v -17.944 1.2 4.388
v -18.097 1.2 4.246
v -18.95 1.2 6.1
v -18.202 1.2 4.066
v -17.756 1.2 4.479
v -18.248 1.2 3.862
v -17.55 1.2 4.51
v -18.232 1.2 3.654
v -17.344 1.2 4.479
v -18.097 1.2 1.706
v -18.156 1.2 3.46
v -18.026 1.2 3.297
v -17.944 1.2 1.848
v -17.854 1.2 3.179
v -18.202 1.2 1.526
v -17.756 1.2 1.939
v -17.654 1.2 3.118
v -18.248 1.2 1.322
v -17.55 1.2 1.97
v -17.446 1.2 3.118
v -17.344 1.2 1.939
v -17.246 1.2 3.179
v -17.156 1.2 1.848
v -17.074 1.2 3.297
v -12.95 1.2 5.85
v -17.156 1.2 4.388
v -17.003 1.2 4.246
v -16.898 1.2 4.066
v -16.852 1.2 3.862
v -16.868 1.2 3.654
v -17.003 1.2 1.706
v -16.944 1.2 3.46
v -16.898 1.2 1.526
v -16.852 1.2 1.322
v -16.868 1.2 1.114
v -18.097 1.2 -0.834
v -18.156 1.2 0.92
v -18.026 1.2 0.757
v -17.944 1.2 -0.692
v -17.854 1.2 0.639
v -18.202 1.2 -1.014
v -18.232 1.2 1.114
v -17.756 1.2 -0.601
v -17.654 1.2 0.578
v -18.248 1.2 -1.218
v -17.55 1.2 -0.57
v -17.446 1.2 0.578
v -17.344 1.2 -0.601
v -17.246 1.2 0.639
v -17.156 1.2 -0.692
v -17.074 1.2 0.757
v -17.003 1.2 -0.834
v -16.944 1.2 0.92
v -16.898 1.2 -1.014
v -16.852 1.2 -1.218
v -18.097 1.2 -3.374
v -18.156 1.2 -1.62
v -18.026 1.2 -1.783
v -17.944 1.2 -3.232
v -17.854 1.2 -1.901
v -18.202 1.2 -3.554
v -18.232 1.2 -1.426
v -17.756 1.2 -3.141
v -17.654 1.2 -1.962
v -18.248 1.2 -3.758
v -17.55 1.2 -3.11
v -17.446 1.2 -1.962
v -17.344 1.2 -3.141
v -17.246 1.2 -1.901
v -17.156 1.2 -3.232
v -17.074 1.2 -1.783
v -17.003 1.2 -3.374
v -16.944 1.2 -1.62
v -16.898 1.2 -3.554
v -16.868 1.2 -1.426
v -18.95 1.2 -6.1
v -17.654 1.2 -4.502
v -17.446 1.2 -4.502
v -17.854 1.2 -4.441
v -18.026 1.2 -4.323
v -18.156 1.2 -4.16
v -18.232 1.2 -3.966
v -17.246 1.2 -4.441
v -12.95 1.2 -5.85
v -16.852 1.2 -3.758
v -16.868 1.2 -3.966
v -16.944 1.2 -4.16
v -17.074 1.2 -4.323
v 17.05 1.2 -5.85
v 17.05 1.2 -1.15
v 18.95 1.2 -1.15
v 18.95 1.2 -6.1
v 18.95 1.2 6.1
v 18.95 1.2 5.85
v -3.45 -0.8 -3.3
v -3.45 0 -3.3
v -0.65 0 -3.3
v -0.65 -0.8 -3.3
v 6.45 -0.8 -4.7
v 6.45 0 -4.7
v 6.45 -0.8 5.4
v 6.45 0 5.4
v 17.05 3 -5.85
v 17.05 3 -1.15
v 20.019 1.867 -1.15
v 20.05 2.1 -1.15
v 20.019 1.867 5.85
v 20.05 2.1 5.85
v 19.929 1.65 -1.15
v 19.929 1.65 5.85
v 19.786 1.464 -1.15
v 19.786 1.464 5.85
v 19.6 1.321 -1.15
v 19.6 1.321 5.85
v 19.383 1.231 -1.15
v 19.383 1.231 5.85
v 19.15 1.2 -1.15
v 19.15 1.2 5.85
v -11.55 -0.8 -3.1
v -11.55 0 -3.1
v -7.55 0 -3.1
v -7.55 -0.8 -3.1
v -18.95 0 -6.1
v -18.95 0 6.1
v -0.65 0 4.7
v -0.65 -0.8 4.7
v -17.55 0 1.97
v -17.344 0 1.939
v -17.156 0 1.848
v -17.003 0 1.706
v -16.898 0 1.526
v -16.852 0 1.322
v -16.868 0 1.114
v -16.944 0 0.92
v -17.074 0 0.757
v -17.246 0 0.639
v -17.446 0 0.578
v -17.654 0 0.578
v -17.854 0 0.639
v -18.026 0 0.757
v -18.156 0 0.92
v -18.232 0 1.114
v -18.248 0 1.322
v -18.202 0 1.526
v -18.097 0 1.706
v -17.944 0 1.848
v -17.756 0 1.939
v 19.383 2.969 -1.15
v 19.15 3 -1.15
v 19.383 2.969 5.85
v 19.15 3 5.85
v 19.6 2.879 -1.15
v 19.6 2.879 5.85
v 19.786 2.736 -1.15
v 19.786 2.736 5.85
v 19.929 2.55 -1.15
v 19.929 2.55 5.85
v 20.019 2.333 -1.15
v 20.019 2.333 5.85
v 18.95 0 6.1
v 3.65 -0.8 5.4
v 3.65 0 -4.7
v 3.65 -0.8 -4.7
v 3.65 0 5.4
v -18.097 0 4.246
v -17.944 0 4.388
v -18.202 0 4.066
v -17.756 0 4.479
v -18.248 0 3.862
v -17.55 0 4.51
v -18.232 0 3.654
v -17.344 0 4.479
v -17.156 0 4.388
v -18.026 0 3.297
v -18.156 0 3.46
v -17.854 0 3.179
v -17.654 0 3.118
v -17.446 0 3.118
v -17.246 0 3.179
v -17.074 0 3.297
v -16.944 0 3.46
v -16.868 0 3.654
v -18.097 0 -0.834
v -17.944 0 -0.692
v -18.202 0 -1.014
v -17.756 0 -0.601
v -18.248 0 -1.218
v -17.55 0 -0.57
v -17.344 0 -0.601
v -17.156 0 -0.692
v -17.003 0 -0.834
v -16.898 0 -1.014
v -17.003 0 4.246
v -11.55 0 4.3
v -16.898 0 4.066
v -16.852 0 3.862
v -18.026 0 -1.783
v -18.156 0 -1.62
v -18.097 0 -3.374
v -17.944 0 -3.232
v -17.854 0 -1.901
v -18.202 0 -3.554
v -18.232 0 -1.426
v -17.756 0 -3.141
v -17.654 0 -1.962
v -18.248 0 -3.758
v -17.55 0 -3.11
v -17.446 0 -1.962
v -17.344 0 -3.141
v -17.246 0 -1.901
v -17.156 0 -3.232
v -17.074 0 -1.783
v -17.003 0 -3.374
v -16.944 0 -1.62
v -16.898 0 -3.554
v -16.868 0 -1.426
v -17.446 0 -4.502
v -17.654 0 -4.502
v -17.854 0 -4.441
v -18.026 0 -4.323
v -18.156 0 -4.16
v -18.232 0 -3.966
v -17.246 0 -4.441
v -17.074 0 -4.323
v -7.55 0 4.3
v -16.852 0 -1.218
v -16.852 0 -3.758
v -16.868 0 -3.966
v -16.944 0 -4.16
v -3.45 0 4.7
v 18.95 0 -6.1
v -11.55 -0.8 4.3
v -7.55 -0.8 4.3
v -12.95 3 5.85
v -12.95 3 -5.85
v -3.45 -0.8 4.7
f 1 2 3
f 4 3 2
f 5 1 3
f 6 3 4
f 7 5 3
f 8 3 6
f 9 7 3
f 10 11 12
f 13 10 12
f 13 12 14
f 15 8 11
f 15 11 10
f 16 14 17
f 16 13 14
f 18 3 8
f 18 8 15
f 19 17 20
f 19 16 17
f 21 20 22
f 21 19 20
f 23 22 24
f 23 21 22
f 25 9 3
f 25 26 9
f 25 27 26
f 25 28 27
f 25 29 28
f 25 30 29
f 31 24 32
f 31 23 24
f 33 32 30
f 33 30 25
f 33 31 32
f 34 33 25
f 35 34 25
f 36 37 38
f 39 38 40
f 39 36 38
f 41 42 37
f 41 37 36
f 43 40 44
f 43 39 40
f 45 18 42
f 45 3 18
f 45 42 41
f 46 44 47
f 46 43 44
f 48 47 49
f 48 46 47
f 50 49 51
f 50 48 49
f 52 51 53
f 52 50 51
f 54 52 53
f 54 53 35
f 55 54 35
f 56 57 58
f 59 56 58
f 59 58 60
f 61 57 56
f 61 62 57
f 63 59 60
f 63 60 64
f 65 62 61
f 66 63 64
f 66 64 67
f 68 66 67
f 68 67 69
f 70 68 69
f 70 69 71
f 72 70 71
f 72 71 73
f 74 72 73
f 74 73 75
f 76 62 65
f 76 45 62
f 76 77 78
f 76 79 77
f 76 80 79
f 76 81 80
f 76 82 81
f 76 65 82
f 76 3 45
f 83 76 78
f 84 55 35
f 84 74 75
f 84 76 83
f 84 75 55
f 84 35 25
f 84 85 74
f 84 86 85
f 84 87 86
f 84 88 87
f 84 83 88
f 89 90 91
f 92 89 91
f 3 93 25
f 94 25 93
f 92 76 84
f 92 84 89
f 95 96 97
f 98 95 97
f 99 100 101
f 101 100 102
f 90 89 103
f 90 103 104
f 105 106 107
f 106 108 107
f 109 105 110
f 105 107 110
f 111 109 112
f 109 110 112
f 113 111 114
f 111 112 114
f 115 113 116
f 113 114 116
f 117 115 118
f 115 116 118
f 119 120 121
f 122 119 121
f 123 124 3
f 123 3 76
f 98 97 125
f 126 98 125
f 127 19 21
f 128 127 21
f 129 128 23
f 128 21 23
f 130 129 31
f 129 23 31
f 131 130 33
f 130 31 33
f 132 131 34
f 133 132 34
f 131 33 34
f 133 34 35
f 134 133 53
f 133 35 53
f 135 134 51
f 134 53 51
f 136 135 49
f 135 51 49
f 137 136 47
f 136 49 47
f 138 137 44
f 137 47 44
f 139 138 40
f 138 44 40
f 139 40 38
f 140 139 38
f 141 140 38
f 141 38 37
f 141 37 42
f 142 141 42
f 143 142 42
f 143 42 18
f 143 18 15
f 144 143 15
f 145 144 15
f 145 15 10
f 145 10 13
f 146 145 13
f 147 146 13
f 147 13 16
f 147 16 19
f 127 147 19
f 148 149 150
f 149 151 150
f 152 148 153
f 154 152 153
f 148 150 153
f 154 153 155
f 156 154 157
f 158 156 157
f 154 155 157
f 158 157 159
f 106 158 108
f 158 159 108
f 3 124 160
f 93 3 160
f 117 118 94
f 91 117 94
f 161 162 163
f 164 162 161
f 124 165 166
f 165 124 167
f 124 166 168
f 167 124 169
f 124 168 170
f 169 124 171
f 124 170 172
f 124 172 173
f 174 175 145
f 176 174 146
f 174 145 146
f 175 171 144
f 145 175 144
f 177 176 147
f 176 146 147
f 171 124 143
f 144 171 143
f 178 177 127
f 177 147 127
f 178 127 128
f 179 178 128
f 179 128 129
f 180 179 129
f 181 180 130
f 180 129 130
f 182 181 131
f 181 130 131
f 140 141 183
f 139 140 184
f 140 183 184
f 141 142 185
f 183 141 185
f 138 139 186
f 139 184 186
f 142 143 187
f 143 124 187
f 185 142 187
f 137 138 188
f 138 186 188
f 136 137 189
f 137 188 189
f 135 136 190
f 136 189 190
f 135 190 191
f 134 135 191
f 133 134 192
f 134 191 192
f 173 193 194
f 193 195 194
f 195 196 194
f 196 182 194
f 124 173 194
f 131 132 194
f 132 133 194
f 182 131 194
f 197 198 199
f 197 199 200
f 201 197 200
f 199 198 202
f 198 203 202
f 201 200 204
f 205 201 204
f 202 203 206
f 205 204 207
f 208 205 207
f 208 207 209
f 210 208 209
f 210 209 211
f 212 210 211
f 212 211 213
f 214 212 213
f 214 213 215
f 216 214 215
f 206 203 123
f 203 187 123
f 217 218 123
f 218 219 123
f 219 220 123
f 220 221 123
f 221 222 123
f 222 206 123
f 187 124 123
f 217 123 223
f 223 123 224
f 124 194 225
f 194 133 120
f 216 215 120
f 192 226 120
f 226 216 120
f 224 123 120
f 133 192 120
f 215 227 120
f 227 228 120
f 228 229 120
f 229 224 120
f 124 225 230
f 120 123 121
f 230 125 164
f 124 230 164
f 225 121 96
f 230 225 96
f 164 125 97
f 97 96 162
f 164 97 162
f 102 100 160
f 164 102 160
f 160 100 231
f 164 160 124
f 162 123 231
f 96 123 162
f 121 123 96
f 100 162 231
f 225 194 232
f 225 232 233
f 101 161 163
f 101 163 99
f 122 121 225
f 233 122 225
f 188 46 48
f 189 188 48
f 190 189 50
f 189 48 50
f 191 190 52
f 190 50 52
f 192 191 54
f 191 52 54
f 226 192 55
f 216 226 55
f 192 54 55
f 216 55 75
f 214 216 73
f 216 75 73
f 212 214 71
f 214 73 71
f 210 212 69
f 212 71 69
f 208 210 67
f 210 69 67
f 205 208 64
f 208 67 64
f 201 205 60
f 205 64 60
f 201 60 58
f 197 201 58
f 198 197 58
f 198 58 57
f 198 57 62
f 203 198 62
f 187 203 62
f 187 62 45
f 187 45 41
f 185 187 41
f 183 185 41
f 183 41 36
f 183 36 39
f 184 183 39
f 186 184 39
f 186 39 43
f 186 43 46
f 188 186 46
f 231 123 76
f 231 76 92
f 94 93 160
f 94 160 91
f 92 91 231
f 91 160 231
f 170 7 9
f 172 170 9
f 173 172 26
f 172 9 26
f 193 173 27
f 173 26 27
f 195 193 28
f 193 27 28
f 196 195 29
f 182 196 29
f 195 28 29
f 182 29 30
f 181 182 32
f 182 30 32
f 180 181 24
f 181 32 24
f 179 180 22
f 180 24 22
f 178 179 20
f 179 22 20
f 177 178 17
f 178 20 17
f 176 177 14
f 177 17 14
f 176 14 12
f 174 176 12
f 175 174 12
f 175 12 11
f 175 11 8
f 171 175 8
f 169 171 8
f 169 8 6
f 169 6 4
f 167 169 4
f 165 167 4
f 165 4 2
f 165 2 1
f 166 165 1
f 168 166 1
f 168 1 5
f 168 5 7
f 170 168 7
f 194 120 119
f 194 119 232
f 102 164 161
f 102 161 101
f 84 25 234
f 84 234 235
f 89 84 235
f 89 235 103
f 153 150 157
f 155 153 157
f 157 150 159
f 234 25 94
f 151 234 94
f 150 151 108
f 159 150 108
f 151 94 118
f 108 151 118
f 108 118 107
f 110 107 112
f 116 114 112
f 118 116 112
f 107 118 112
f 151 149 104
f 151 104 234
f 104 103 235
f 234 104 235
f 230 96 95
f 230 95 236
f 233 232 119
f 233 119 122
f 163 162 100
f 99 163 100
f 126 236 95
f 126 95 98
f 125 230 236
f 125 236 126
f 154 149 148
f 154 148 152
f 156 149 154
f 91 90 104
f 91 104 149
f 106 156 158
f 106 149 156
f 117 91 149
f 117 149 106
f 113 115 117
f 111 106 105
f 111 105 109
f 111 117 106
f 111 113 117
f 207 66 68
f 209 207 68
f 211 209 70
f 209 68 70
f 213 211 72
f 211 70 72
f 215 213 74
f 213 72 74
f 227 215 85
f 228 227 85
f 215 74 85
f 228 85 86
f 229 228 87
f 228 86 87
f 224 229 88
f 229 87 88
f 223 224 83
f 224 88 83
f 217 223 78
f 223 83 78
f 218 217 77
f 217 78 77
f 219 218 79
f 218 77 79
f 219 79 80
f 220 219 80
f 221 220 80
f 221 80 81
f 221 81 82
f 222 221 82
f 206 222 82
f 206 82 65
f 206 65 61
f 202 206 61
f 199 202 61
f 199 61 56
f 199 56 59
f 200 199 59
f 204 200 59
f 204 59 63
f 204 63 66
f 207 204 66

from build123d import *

# Parameters (mm, degrees)
SKETCH_1_W          = 37.9
SKETCH_1_H          = 12.2
EXTRUDE_1_DEPTH     = 1.2
EXTRUDE_2_DEPTH     = 1.8
FILLET_1_R          = 0.9
SKETCH_4_R          = 0.7
CUT_EXTRUDE_1_DEPTH = 22.034554904
SKETCH_5_W          = 2.8
SKETCH_5_H          = 10.1
SKETCH_5_H_2        = 8
SKETCH_5_W_2        = 4
SKETCH_5_H_3        = 7.4
EXTRUDE_3_DEPTH     = 0.8


with BuildPart() as part:
    # Эскиз1 → Бобышка-Вытянуть1 (new body)
    with BuildSketch(Plane(origin=(0, 0, 0), x_dir=(1, 0, 0), z_dir=(0, 1, 0))):
        Rectangle(SKETCH_1_W, SKETCH_1_H)
    extrude(amount=EXTRUDE_1_DEPTH)

    # Эскиз2 → Бобышка-Вытянуть2 (add)
    with BuildSketch(Plane(origin=(0, 1.2, 0), x_dir=(1, 0, 0), z_dir=(0, 1, 0))):
        Polygon((-12.95, 5.85), (17.05, 5.85), (17.05, 1.15), (20.05, 1.15), (20.05, -5.85), (17.05, -5.85), (-12.95, -5.85), align=None)
    extrude(amount=EXTRUDE_2_DEPTH)

    # Скругление1
    fillet_1_edges = [part.edges().sort_by_distance(p)[0] for p in [
        (20.05, 1.2, 2.35),
        (20.05, 3, 2.35),
    ]]
    fillet(fillet_1_edges, radius=FILLET_1_R - 0.0001)  # a hair under: the kernel refuses the full size

    # Эскиз4 → Вырез-Вытянуть1 (cut, through all)
    with BuildSketch(Plane(origin=(0, 1.2, 0), x_dir=(1, 0, 0), z_dir=(0, 1, 0))):
        with Locations(Location((-17.55, 3.81, 0), (0, 0, 270))):
            Circle(SKETCH_4_R)
        with Locations(Location((-17.55, 1.27, 0), (0, 0, 270))):
            Circle(SKETCH_4_R)
        with Locations(Location((-17.55, -1.27, 0), (0, 0, 270))):
            Circle(SKETCH_4_R)
        with Locations(Location((-17.55, -3.81, 0), (0, 0, 270))):
            Circle(SKETCH_4_R)
    extrude(amount=-CUT_EXTRUDE_1_DEPTH, mode=Mode.SUBTRACT)

    # Эскиз5 → Бобышка-Вытянуть3 (add)
    with BuildSketch(Plane.XZ):
        with Locations((5.05, 0.35)):
            Rectangle(SKETCH_5_W, SKETCH_5_H)
        with Locations((-2.05, 0.7)):
            Rectangle(SKETCH_5_W, SKETCH_5_H_2)
        with Locations((-9.55, 0.6)):
            Rectangle(SKETCH_5_W_2, SKETCH_5_H_3)
    extrude(amount=EXTRUDE_3_DEPTH)


solid = part.part
